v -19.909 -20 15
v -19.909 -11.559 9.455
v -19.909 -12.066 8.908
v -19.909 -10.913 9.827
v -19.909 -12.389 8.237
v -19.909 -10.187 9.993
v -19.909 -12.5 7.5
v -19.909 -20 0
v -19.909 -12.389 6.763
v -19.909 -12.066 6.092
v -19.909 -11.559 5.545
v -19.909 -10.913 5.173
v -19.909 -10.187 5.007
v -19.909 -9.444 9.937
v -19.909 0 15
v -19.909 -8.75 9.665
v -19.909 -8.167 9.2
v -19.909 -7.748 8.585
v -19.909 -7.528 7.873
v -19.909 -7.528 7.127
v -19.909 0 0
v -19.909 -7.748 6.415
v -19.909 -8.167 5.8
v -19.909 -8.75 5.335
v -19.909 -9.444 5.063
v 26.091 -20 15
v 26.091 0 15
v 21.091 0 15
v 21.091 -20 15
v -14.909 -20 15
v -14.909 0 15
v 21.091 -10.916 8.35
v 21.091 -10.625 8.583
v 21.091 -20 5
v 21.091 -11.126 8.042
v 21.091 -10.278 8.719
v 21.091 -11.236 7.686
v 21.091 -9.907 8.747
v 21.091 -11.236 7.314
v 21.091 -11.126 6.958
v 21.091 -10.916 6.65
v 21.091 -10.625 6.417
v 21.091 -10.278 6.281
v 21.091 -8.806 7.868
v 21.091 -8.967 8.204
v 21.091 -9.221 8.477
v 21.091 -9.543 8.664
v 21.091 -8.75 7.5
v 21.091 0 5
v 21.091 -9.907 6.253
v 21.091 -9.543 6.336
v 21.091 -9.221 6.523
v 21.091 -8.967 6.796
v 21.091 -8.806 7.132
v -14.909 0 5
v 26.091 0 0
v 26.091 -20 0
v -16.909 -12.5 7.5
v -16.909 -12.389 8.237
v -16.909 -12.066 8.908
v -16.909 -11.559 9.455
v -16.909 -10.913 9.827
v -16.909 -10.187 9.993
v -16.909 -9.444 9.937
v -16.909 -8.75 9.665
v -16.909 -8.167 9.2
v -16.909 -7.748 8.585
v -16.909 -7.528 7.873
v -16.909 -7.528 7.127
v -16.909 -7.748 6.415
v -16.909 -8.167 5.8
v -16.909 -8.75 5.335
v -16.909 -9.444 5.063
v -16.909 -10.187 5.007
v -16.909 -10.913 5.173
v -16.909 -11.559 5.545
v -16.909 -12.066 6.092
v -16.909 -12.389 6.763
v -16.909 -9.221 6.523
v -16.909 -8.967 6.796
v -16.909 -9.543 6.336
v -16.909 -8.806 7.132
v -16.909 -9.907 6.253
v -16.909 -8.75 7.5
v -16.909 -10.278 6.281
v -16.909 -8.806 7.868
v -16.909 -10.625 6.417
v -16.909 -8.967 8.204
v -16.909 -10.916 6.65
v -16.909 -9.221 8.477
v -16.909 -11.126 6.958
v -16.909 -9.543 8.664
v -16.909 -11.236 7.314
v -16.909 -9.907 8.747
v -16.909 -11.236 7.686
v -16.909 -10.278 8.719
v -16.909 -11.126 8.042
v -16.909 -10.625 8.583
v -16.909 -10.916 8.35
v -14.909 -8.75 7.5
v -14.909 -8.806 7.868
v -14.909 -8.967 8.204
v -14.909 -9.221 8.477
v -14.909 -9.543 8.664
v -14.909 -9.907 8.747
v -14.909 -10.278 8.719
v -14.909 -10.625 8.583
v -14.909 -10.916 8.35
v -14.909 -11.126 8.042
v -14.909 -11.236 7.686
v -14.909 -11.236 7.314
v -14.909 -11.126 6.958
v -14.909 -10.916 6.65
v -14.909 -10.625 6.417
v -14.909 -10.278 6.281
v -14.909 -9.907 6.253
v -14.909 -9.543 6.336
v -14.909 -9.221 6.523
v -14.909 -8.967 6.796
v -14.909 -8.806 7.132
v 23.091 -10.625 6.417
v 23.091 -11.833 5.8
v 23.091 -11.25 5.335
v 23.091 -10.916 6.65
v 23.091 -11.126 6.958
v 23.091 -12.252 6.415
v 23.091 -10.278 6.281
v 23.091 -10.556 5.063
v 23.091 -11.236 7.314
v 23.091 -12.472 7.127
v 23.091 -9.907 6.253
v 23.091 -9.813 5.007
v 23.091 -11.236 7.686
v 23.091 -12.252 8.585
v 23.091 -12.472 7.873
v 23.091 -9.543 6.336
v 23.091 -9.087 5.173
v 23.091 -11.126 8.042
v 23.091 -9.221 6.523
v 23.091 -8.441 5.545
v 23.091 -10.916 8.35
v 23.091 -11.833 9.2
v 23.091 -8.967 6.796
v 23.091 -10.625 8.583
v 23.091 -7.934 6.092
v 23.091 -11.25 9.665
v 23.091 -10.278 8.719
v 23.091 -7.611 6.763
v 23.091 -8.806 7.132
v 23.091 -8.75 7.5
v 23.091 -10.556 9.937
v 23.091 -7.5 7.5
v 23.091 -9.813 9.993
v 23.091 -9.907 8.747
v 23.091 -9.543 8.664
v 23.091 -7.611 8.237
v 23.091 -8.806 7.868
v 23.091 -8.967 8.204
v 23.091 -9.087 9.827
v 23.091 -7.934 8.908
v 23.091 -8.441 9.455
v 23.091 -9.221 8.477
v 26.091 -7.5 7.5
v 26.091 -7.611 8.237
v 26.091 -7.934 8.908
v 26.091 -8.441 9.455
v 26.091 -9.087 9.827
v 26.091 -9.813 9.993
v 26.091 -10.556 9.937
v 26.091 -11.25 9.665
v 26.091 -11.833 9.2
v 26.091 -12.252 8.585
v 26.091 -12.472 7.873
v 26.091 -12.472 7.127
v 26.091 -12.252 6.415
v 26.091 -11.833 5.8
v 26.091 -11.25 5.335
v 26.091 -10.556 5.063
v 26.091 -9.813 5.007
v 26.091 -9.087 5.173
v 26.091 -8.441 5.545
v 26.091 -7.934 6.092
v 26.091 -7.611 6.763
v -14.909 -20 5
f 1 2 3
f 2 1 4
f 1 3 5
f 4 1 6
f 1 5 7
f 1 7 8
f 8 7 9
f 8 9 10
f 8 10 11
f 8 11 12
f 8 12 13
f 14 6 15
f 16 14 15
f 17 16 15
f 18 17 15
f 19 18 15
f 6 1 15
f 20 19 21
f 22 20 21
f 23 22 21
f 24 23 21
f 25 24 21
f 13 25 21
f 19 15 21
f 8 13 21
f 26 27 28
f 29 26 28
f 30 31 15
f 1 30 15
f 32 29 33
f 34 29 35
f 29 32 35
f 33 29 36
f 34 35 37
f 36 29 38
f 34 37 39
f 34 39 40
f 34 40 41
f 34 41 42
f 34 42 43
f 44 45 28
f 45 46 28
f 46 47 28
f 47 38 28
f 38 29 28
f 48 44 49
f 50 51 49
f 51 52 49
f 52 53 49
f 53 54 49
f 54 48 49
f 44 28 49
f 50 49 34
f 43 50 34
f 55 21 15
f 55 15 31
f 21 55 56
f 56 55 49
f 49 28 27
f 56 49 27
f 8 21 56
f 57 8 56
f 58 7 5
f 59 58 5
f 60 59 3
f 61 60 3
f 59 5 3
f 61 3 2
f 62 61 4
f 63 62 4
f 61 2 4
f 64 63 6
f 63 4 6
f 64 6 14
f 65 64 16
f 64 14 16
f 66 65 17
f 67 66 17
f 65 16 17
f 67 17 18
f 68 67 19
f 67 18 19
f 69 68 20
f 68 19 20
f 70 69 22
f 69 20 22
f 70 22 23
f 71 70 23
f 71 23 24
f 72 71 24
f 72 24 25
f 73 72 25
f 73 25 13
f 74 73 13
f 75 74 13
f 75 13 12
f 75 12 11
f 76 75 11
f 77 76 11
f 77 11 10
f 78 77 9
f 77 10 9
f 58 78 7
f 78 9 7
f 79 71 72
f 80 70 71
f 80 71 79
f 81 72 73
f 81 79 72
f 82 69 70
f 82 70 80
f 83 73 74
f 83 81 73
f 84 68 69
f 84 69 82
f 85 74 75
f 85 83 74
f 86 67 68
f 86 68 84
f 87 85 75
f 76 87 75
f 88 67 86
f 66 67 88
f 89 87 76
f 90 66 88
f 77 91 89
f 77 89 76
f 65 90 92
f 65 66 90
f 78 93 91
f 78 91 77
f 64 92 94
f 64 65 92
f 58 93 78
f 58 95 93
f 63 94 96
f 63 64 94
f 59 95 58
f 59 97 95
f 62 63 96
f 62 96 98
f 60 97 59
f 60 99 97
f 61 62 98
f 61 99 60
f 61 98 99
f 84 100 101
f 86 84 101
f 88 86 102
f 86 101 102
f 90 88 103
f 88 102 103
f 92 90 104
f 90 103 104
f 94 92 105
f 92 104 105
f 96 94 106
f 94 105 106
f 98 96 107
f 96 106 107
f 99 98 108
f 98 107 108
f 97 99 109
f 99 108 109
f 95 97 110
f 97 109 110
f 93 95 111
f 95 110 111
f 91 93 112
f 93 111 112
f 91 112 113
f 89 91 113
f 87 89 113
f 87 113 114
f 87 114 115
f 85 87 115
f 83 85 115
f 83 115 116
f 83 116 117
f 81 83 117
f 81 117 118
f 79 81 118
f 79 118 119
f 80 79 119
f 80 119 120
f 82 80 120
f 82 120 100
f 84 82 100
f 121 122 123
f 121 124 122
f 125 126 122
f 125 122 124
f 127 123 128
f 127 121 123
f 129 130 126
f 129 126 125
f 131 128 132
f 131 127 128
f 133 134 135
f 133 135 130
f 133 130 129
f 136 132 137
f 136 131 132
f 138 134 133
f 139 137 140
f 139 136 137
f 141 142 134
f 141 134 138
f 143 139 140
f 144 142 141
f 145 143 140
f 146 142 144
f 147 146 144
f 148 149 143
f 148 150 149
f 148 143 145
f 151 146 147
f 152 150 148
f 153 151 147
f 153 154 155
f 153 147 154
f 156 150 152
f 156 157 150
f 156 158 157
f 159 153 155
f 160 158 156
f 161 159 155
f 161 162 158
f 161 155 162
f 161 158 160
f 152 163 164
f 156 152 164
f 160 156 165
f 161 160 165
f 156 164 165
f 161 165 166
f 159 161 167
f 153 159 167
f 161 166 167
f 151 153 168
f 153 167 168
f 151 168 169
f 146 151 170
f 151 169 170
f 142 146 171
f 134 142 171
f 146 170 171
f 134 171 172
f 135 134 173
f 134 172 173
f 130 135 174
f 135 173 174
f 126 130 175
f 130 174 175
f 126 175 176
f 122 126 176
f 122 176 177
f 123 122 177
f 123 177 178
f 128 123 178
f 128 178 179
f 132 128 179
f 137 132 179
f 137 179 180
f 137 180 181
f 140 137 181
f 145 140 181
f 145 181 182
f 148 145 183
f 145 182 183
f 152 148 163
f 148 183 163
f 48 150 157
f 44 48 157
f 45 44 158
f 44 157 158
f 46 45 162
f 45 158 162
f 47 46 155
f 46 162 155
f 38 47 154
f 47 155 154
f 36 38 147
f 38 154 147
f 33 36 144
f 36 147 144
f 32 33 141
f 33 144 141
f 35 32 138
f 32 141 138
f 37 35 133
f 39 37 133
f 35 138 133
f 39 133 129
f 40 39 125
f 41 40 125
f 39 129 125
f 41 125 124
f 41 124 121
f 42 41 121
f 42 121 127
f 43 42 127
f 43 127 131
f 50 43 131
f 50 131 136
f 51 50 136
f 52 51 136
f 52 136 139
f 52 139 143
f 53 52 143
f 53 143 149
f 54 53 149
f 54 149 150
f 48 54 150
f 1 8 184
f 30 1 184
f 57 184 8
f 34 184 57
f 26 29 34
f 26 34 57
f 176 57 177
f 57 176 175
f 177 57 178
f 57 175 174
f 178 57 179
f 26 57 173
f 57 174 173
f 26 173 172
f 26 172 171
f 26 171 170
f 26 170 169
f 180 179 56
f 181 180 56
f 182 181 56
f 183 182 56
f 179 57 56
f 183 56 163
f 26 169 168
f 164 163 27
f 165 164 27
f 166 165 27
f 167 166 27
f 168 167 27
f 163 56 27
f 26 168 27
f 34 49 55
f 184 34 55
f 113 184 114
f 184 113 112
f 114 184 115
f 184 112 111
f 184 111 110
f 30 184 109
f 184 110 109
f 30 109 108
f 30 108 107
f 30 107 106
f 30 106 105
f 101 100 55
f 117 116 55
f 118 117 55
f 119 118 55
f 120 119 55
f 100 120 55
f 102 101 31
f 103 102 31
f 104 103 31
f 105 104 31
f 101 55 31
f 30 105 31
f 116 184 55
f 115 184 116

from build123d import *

# Parameters (mm, degrees)
PAD_DEPTH       = 20
SKETCH001_R     = 1.25
POCKET_DEPTH    = 46.001
SKETCH002_R     = 2.5
POCKET001_DEPTH = 3
SKETCH003_R     = 2.5
POCKET002_DEPTH = 3


with BuildPart() as part:
    # Sketch (on XZ_Plane of Origin) → Pad (new body)
    with BuildSketch(Plane.XZ):
        Polygon((-19.90873, 15), (-19.90873, 0), (26.09127, 0), (26.09127, 15), (21.09127, 15), (21.09127, 5), (-14.90873, 5), (-14.90873, 15), align=None)
    extrude(amount=PAD_DEPTH)

    # Sketch001 (on Face3 of Pad) → Pocket (cut, through all)
    with BuildSketch(Plane.YZ.offset(26.09127)):
        with Locations((-10, 7.5)):
            Circle(SKETCH001_R)
    extrude(amount=-POCKET_DEPTH, mode=Mode.SUBTRACT)

    # Sketch002 (on Face1 of Pocket) → Pocket001 (cut)
    with BuildSketch(Plane(origin=(-19.90873, 0, 0), x_dir=(0, -1, 0), z_dir=(-1, 0, 0))):
        with Locations((10, 7.5)):
            Circle(SKETCH002_R)
    extrude(amount=-POCKET001_DEPTH, mode=Mode.SUBTRACT)

    # Sketch003 (on Face8 of Pocket001) → Pocket002 (cut)
    with BuildSketch(Plane.YZ.offset(26.09127)):
        with Locations((-10, 7.5)):
            Circle(SKETCH003_R)
    extrude(amount=-POCKET002_DEPTH, mode=Mode.SUBTRACT)


solid = part.part
